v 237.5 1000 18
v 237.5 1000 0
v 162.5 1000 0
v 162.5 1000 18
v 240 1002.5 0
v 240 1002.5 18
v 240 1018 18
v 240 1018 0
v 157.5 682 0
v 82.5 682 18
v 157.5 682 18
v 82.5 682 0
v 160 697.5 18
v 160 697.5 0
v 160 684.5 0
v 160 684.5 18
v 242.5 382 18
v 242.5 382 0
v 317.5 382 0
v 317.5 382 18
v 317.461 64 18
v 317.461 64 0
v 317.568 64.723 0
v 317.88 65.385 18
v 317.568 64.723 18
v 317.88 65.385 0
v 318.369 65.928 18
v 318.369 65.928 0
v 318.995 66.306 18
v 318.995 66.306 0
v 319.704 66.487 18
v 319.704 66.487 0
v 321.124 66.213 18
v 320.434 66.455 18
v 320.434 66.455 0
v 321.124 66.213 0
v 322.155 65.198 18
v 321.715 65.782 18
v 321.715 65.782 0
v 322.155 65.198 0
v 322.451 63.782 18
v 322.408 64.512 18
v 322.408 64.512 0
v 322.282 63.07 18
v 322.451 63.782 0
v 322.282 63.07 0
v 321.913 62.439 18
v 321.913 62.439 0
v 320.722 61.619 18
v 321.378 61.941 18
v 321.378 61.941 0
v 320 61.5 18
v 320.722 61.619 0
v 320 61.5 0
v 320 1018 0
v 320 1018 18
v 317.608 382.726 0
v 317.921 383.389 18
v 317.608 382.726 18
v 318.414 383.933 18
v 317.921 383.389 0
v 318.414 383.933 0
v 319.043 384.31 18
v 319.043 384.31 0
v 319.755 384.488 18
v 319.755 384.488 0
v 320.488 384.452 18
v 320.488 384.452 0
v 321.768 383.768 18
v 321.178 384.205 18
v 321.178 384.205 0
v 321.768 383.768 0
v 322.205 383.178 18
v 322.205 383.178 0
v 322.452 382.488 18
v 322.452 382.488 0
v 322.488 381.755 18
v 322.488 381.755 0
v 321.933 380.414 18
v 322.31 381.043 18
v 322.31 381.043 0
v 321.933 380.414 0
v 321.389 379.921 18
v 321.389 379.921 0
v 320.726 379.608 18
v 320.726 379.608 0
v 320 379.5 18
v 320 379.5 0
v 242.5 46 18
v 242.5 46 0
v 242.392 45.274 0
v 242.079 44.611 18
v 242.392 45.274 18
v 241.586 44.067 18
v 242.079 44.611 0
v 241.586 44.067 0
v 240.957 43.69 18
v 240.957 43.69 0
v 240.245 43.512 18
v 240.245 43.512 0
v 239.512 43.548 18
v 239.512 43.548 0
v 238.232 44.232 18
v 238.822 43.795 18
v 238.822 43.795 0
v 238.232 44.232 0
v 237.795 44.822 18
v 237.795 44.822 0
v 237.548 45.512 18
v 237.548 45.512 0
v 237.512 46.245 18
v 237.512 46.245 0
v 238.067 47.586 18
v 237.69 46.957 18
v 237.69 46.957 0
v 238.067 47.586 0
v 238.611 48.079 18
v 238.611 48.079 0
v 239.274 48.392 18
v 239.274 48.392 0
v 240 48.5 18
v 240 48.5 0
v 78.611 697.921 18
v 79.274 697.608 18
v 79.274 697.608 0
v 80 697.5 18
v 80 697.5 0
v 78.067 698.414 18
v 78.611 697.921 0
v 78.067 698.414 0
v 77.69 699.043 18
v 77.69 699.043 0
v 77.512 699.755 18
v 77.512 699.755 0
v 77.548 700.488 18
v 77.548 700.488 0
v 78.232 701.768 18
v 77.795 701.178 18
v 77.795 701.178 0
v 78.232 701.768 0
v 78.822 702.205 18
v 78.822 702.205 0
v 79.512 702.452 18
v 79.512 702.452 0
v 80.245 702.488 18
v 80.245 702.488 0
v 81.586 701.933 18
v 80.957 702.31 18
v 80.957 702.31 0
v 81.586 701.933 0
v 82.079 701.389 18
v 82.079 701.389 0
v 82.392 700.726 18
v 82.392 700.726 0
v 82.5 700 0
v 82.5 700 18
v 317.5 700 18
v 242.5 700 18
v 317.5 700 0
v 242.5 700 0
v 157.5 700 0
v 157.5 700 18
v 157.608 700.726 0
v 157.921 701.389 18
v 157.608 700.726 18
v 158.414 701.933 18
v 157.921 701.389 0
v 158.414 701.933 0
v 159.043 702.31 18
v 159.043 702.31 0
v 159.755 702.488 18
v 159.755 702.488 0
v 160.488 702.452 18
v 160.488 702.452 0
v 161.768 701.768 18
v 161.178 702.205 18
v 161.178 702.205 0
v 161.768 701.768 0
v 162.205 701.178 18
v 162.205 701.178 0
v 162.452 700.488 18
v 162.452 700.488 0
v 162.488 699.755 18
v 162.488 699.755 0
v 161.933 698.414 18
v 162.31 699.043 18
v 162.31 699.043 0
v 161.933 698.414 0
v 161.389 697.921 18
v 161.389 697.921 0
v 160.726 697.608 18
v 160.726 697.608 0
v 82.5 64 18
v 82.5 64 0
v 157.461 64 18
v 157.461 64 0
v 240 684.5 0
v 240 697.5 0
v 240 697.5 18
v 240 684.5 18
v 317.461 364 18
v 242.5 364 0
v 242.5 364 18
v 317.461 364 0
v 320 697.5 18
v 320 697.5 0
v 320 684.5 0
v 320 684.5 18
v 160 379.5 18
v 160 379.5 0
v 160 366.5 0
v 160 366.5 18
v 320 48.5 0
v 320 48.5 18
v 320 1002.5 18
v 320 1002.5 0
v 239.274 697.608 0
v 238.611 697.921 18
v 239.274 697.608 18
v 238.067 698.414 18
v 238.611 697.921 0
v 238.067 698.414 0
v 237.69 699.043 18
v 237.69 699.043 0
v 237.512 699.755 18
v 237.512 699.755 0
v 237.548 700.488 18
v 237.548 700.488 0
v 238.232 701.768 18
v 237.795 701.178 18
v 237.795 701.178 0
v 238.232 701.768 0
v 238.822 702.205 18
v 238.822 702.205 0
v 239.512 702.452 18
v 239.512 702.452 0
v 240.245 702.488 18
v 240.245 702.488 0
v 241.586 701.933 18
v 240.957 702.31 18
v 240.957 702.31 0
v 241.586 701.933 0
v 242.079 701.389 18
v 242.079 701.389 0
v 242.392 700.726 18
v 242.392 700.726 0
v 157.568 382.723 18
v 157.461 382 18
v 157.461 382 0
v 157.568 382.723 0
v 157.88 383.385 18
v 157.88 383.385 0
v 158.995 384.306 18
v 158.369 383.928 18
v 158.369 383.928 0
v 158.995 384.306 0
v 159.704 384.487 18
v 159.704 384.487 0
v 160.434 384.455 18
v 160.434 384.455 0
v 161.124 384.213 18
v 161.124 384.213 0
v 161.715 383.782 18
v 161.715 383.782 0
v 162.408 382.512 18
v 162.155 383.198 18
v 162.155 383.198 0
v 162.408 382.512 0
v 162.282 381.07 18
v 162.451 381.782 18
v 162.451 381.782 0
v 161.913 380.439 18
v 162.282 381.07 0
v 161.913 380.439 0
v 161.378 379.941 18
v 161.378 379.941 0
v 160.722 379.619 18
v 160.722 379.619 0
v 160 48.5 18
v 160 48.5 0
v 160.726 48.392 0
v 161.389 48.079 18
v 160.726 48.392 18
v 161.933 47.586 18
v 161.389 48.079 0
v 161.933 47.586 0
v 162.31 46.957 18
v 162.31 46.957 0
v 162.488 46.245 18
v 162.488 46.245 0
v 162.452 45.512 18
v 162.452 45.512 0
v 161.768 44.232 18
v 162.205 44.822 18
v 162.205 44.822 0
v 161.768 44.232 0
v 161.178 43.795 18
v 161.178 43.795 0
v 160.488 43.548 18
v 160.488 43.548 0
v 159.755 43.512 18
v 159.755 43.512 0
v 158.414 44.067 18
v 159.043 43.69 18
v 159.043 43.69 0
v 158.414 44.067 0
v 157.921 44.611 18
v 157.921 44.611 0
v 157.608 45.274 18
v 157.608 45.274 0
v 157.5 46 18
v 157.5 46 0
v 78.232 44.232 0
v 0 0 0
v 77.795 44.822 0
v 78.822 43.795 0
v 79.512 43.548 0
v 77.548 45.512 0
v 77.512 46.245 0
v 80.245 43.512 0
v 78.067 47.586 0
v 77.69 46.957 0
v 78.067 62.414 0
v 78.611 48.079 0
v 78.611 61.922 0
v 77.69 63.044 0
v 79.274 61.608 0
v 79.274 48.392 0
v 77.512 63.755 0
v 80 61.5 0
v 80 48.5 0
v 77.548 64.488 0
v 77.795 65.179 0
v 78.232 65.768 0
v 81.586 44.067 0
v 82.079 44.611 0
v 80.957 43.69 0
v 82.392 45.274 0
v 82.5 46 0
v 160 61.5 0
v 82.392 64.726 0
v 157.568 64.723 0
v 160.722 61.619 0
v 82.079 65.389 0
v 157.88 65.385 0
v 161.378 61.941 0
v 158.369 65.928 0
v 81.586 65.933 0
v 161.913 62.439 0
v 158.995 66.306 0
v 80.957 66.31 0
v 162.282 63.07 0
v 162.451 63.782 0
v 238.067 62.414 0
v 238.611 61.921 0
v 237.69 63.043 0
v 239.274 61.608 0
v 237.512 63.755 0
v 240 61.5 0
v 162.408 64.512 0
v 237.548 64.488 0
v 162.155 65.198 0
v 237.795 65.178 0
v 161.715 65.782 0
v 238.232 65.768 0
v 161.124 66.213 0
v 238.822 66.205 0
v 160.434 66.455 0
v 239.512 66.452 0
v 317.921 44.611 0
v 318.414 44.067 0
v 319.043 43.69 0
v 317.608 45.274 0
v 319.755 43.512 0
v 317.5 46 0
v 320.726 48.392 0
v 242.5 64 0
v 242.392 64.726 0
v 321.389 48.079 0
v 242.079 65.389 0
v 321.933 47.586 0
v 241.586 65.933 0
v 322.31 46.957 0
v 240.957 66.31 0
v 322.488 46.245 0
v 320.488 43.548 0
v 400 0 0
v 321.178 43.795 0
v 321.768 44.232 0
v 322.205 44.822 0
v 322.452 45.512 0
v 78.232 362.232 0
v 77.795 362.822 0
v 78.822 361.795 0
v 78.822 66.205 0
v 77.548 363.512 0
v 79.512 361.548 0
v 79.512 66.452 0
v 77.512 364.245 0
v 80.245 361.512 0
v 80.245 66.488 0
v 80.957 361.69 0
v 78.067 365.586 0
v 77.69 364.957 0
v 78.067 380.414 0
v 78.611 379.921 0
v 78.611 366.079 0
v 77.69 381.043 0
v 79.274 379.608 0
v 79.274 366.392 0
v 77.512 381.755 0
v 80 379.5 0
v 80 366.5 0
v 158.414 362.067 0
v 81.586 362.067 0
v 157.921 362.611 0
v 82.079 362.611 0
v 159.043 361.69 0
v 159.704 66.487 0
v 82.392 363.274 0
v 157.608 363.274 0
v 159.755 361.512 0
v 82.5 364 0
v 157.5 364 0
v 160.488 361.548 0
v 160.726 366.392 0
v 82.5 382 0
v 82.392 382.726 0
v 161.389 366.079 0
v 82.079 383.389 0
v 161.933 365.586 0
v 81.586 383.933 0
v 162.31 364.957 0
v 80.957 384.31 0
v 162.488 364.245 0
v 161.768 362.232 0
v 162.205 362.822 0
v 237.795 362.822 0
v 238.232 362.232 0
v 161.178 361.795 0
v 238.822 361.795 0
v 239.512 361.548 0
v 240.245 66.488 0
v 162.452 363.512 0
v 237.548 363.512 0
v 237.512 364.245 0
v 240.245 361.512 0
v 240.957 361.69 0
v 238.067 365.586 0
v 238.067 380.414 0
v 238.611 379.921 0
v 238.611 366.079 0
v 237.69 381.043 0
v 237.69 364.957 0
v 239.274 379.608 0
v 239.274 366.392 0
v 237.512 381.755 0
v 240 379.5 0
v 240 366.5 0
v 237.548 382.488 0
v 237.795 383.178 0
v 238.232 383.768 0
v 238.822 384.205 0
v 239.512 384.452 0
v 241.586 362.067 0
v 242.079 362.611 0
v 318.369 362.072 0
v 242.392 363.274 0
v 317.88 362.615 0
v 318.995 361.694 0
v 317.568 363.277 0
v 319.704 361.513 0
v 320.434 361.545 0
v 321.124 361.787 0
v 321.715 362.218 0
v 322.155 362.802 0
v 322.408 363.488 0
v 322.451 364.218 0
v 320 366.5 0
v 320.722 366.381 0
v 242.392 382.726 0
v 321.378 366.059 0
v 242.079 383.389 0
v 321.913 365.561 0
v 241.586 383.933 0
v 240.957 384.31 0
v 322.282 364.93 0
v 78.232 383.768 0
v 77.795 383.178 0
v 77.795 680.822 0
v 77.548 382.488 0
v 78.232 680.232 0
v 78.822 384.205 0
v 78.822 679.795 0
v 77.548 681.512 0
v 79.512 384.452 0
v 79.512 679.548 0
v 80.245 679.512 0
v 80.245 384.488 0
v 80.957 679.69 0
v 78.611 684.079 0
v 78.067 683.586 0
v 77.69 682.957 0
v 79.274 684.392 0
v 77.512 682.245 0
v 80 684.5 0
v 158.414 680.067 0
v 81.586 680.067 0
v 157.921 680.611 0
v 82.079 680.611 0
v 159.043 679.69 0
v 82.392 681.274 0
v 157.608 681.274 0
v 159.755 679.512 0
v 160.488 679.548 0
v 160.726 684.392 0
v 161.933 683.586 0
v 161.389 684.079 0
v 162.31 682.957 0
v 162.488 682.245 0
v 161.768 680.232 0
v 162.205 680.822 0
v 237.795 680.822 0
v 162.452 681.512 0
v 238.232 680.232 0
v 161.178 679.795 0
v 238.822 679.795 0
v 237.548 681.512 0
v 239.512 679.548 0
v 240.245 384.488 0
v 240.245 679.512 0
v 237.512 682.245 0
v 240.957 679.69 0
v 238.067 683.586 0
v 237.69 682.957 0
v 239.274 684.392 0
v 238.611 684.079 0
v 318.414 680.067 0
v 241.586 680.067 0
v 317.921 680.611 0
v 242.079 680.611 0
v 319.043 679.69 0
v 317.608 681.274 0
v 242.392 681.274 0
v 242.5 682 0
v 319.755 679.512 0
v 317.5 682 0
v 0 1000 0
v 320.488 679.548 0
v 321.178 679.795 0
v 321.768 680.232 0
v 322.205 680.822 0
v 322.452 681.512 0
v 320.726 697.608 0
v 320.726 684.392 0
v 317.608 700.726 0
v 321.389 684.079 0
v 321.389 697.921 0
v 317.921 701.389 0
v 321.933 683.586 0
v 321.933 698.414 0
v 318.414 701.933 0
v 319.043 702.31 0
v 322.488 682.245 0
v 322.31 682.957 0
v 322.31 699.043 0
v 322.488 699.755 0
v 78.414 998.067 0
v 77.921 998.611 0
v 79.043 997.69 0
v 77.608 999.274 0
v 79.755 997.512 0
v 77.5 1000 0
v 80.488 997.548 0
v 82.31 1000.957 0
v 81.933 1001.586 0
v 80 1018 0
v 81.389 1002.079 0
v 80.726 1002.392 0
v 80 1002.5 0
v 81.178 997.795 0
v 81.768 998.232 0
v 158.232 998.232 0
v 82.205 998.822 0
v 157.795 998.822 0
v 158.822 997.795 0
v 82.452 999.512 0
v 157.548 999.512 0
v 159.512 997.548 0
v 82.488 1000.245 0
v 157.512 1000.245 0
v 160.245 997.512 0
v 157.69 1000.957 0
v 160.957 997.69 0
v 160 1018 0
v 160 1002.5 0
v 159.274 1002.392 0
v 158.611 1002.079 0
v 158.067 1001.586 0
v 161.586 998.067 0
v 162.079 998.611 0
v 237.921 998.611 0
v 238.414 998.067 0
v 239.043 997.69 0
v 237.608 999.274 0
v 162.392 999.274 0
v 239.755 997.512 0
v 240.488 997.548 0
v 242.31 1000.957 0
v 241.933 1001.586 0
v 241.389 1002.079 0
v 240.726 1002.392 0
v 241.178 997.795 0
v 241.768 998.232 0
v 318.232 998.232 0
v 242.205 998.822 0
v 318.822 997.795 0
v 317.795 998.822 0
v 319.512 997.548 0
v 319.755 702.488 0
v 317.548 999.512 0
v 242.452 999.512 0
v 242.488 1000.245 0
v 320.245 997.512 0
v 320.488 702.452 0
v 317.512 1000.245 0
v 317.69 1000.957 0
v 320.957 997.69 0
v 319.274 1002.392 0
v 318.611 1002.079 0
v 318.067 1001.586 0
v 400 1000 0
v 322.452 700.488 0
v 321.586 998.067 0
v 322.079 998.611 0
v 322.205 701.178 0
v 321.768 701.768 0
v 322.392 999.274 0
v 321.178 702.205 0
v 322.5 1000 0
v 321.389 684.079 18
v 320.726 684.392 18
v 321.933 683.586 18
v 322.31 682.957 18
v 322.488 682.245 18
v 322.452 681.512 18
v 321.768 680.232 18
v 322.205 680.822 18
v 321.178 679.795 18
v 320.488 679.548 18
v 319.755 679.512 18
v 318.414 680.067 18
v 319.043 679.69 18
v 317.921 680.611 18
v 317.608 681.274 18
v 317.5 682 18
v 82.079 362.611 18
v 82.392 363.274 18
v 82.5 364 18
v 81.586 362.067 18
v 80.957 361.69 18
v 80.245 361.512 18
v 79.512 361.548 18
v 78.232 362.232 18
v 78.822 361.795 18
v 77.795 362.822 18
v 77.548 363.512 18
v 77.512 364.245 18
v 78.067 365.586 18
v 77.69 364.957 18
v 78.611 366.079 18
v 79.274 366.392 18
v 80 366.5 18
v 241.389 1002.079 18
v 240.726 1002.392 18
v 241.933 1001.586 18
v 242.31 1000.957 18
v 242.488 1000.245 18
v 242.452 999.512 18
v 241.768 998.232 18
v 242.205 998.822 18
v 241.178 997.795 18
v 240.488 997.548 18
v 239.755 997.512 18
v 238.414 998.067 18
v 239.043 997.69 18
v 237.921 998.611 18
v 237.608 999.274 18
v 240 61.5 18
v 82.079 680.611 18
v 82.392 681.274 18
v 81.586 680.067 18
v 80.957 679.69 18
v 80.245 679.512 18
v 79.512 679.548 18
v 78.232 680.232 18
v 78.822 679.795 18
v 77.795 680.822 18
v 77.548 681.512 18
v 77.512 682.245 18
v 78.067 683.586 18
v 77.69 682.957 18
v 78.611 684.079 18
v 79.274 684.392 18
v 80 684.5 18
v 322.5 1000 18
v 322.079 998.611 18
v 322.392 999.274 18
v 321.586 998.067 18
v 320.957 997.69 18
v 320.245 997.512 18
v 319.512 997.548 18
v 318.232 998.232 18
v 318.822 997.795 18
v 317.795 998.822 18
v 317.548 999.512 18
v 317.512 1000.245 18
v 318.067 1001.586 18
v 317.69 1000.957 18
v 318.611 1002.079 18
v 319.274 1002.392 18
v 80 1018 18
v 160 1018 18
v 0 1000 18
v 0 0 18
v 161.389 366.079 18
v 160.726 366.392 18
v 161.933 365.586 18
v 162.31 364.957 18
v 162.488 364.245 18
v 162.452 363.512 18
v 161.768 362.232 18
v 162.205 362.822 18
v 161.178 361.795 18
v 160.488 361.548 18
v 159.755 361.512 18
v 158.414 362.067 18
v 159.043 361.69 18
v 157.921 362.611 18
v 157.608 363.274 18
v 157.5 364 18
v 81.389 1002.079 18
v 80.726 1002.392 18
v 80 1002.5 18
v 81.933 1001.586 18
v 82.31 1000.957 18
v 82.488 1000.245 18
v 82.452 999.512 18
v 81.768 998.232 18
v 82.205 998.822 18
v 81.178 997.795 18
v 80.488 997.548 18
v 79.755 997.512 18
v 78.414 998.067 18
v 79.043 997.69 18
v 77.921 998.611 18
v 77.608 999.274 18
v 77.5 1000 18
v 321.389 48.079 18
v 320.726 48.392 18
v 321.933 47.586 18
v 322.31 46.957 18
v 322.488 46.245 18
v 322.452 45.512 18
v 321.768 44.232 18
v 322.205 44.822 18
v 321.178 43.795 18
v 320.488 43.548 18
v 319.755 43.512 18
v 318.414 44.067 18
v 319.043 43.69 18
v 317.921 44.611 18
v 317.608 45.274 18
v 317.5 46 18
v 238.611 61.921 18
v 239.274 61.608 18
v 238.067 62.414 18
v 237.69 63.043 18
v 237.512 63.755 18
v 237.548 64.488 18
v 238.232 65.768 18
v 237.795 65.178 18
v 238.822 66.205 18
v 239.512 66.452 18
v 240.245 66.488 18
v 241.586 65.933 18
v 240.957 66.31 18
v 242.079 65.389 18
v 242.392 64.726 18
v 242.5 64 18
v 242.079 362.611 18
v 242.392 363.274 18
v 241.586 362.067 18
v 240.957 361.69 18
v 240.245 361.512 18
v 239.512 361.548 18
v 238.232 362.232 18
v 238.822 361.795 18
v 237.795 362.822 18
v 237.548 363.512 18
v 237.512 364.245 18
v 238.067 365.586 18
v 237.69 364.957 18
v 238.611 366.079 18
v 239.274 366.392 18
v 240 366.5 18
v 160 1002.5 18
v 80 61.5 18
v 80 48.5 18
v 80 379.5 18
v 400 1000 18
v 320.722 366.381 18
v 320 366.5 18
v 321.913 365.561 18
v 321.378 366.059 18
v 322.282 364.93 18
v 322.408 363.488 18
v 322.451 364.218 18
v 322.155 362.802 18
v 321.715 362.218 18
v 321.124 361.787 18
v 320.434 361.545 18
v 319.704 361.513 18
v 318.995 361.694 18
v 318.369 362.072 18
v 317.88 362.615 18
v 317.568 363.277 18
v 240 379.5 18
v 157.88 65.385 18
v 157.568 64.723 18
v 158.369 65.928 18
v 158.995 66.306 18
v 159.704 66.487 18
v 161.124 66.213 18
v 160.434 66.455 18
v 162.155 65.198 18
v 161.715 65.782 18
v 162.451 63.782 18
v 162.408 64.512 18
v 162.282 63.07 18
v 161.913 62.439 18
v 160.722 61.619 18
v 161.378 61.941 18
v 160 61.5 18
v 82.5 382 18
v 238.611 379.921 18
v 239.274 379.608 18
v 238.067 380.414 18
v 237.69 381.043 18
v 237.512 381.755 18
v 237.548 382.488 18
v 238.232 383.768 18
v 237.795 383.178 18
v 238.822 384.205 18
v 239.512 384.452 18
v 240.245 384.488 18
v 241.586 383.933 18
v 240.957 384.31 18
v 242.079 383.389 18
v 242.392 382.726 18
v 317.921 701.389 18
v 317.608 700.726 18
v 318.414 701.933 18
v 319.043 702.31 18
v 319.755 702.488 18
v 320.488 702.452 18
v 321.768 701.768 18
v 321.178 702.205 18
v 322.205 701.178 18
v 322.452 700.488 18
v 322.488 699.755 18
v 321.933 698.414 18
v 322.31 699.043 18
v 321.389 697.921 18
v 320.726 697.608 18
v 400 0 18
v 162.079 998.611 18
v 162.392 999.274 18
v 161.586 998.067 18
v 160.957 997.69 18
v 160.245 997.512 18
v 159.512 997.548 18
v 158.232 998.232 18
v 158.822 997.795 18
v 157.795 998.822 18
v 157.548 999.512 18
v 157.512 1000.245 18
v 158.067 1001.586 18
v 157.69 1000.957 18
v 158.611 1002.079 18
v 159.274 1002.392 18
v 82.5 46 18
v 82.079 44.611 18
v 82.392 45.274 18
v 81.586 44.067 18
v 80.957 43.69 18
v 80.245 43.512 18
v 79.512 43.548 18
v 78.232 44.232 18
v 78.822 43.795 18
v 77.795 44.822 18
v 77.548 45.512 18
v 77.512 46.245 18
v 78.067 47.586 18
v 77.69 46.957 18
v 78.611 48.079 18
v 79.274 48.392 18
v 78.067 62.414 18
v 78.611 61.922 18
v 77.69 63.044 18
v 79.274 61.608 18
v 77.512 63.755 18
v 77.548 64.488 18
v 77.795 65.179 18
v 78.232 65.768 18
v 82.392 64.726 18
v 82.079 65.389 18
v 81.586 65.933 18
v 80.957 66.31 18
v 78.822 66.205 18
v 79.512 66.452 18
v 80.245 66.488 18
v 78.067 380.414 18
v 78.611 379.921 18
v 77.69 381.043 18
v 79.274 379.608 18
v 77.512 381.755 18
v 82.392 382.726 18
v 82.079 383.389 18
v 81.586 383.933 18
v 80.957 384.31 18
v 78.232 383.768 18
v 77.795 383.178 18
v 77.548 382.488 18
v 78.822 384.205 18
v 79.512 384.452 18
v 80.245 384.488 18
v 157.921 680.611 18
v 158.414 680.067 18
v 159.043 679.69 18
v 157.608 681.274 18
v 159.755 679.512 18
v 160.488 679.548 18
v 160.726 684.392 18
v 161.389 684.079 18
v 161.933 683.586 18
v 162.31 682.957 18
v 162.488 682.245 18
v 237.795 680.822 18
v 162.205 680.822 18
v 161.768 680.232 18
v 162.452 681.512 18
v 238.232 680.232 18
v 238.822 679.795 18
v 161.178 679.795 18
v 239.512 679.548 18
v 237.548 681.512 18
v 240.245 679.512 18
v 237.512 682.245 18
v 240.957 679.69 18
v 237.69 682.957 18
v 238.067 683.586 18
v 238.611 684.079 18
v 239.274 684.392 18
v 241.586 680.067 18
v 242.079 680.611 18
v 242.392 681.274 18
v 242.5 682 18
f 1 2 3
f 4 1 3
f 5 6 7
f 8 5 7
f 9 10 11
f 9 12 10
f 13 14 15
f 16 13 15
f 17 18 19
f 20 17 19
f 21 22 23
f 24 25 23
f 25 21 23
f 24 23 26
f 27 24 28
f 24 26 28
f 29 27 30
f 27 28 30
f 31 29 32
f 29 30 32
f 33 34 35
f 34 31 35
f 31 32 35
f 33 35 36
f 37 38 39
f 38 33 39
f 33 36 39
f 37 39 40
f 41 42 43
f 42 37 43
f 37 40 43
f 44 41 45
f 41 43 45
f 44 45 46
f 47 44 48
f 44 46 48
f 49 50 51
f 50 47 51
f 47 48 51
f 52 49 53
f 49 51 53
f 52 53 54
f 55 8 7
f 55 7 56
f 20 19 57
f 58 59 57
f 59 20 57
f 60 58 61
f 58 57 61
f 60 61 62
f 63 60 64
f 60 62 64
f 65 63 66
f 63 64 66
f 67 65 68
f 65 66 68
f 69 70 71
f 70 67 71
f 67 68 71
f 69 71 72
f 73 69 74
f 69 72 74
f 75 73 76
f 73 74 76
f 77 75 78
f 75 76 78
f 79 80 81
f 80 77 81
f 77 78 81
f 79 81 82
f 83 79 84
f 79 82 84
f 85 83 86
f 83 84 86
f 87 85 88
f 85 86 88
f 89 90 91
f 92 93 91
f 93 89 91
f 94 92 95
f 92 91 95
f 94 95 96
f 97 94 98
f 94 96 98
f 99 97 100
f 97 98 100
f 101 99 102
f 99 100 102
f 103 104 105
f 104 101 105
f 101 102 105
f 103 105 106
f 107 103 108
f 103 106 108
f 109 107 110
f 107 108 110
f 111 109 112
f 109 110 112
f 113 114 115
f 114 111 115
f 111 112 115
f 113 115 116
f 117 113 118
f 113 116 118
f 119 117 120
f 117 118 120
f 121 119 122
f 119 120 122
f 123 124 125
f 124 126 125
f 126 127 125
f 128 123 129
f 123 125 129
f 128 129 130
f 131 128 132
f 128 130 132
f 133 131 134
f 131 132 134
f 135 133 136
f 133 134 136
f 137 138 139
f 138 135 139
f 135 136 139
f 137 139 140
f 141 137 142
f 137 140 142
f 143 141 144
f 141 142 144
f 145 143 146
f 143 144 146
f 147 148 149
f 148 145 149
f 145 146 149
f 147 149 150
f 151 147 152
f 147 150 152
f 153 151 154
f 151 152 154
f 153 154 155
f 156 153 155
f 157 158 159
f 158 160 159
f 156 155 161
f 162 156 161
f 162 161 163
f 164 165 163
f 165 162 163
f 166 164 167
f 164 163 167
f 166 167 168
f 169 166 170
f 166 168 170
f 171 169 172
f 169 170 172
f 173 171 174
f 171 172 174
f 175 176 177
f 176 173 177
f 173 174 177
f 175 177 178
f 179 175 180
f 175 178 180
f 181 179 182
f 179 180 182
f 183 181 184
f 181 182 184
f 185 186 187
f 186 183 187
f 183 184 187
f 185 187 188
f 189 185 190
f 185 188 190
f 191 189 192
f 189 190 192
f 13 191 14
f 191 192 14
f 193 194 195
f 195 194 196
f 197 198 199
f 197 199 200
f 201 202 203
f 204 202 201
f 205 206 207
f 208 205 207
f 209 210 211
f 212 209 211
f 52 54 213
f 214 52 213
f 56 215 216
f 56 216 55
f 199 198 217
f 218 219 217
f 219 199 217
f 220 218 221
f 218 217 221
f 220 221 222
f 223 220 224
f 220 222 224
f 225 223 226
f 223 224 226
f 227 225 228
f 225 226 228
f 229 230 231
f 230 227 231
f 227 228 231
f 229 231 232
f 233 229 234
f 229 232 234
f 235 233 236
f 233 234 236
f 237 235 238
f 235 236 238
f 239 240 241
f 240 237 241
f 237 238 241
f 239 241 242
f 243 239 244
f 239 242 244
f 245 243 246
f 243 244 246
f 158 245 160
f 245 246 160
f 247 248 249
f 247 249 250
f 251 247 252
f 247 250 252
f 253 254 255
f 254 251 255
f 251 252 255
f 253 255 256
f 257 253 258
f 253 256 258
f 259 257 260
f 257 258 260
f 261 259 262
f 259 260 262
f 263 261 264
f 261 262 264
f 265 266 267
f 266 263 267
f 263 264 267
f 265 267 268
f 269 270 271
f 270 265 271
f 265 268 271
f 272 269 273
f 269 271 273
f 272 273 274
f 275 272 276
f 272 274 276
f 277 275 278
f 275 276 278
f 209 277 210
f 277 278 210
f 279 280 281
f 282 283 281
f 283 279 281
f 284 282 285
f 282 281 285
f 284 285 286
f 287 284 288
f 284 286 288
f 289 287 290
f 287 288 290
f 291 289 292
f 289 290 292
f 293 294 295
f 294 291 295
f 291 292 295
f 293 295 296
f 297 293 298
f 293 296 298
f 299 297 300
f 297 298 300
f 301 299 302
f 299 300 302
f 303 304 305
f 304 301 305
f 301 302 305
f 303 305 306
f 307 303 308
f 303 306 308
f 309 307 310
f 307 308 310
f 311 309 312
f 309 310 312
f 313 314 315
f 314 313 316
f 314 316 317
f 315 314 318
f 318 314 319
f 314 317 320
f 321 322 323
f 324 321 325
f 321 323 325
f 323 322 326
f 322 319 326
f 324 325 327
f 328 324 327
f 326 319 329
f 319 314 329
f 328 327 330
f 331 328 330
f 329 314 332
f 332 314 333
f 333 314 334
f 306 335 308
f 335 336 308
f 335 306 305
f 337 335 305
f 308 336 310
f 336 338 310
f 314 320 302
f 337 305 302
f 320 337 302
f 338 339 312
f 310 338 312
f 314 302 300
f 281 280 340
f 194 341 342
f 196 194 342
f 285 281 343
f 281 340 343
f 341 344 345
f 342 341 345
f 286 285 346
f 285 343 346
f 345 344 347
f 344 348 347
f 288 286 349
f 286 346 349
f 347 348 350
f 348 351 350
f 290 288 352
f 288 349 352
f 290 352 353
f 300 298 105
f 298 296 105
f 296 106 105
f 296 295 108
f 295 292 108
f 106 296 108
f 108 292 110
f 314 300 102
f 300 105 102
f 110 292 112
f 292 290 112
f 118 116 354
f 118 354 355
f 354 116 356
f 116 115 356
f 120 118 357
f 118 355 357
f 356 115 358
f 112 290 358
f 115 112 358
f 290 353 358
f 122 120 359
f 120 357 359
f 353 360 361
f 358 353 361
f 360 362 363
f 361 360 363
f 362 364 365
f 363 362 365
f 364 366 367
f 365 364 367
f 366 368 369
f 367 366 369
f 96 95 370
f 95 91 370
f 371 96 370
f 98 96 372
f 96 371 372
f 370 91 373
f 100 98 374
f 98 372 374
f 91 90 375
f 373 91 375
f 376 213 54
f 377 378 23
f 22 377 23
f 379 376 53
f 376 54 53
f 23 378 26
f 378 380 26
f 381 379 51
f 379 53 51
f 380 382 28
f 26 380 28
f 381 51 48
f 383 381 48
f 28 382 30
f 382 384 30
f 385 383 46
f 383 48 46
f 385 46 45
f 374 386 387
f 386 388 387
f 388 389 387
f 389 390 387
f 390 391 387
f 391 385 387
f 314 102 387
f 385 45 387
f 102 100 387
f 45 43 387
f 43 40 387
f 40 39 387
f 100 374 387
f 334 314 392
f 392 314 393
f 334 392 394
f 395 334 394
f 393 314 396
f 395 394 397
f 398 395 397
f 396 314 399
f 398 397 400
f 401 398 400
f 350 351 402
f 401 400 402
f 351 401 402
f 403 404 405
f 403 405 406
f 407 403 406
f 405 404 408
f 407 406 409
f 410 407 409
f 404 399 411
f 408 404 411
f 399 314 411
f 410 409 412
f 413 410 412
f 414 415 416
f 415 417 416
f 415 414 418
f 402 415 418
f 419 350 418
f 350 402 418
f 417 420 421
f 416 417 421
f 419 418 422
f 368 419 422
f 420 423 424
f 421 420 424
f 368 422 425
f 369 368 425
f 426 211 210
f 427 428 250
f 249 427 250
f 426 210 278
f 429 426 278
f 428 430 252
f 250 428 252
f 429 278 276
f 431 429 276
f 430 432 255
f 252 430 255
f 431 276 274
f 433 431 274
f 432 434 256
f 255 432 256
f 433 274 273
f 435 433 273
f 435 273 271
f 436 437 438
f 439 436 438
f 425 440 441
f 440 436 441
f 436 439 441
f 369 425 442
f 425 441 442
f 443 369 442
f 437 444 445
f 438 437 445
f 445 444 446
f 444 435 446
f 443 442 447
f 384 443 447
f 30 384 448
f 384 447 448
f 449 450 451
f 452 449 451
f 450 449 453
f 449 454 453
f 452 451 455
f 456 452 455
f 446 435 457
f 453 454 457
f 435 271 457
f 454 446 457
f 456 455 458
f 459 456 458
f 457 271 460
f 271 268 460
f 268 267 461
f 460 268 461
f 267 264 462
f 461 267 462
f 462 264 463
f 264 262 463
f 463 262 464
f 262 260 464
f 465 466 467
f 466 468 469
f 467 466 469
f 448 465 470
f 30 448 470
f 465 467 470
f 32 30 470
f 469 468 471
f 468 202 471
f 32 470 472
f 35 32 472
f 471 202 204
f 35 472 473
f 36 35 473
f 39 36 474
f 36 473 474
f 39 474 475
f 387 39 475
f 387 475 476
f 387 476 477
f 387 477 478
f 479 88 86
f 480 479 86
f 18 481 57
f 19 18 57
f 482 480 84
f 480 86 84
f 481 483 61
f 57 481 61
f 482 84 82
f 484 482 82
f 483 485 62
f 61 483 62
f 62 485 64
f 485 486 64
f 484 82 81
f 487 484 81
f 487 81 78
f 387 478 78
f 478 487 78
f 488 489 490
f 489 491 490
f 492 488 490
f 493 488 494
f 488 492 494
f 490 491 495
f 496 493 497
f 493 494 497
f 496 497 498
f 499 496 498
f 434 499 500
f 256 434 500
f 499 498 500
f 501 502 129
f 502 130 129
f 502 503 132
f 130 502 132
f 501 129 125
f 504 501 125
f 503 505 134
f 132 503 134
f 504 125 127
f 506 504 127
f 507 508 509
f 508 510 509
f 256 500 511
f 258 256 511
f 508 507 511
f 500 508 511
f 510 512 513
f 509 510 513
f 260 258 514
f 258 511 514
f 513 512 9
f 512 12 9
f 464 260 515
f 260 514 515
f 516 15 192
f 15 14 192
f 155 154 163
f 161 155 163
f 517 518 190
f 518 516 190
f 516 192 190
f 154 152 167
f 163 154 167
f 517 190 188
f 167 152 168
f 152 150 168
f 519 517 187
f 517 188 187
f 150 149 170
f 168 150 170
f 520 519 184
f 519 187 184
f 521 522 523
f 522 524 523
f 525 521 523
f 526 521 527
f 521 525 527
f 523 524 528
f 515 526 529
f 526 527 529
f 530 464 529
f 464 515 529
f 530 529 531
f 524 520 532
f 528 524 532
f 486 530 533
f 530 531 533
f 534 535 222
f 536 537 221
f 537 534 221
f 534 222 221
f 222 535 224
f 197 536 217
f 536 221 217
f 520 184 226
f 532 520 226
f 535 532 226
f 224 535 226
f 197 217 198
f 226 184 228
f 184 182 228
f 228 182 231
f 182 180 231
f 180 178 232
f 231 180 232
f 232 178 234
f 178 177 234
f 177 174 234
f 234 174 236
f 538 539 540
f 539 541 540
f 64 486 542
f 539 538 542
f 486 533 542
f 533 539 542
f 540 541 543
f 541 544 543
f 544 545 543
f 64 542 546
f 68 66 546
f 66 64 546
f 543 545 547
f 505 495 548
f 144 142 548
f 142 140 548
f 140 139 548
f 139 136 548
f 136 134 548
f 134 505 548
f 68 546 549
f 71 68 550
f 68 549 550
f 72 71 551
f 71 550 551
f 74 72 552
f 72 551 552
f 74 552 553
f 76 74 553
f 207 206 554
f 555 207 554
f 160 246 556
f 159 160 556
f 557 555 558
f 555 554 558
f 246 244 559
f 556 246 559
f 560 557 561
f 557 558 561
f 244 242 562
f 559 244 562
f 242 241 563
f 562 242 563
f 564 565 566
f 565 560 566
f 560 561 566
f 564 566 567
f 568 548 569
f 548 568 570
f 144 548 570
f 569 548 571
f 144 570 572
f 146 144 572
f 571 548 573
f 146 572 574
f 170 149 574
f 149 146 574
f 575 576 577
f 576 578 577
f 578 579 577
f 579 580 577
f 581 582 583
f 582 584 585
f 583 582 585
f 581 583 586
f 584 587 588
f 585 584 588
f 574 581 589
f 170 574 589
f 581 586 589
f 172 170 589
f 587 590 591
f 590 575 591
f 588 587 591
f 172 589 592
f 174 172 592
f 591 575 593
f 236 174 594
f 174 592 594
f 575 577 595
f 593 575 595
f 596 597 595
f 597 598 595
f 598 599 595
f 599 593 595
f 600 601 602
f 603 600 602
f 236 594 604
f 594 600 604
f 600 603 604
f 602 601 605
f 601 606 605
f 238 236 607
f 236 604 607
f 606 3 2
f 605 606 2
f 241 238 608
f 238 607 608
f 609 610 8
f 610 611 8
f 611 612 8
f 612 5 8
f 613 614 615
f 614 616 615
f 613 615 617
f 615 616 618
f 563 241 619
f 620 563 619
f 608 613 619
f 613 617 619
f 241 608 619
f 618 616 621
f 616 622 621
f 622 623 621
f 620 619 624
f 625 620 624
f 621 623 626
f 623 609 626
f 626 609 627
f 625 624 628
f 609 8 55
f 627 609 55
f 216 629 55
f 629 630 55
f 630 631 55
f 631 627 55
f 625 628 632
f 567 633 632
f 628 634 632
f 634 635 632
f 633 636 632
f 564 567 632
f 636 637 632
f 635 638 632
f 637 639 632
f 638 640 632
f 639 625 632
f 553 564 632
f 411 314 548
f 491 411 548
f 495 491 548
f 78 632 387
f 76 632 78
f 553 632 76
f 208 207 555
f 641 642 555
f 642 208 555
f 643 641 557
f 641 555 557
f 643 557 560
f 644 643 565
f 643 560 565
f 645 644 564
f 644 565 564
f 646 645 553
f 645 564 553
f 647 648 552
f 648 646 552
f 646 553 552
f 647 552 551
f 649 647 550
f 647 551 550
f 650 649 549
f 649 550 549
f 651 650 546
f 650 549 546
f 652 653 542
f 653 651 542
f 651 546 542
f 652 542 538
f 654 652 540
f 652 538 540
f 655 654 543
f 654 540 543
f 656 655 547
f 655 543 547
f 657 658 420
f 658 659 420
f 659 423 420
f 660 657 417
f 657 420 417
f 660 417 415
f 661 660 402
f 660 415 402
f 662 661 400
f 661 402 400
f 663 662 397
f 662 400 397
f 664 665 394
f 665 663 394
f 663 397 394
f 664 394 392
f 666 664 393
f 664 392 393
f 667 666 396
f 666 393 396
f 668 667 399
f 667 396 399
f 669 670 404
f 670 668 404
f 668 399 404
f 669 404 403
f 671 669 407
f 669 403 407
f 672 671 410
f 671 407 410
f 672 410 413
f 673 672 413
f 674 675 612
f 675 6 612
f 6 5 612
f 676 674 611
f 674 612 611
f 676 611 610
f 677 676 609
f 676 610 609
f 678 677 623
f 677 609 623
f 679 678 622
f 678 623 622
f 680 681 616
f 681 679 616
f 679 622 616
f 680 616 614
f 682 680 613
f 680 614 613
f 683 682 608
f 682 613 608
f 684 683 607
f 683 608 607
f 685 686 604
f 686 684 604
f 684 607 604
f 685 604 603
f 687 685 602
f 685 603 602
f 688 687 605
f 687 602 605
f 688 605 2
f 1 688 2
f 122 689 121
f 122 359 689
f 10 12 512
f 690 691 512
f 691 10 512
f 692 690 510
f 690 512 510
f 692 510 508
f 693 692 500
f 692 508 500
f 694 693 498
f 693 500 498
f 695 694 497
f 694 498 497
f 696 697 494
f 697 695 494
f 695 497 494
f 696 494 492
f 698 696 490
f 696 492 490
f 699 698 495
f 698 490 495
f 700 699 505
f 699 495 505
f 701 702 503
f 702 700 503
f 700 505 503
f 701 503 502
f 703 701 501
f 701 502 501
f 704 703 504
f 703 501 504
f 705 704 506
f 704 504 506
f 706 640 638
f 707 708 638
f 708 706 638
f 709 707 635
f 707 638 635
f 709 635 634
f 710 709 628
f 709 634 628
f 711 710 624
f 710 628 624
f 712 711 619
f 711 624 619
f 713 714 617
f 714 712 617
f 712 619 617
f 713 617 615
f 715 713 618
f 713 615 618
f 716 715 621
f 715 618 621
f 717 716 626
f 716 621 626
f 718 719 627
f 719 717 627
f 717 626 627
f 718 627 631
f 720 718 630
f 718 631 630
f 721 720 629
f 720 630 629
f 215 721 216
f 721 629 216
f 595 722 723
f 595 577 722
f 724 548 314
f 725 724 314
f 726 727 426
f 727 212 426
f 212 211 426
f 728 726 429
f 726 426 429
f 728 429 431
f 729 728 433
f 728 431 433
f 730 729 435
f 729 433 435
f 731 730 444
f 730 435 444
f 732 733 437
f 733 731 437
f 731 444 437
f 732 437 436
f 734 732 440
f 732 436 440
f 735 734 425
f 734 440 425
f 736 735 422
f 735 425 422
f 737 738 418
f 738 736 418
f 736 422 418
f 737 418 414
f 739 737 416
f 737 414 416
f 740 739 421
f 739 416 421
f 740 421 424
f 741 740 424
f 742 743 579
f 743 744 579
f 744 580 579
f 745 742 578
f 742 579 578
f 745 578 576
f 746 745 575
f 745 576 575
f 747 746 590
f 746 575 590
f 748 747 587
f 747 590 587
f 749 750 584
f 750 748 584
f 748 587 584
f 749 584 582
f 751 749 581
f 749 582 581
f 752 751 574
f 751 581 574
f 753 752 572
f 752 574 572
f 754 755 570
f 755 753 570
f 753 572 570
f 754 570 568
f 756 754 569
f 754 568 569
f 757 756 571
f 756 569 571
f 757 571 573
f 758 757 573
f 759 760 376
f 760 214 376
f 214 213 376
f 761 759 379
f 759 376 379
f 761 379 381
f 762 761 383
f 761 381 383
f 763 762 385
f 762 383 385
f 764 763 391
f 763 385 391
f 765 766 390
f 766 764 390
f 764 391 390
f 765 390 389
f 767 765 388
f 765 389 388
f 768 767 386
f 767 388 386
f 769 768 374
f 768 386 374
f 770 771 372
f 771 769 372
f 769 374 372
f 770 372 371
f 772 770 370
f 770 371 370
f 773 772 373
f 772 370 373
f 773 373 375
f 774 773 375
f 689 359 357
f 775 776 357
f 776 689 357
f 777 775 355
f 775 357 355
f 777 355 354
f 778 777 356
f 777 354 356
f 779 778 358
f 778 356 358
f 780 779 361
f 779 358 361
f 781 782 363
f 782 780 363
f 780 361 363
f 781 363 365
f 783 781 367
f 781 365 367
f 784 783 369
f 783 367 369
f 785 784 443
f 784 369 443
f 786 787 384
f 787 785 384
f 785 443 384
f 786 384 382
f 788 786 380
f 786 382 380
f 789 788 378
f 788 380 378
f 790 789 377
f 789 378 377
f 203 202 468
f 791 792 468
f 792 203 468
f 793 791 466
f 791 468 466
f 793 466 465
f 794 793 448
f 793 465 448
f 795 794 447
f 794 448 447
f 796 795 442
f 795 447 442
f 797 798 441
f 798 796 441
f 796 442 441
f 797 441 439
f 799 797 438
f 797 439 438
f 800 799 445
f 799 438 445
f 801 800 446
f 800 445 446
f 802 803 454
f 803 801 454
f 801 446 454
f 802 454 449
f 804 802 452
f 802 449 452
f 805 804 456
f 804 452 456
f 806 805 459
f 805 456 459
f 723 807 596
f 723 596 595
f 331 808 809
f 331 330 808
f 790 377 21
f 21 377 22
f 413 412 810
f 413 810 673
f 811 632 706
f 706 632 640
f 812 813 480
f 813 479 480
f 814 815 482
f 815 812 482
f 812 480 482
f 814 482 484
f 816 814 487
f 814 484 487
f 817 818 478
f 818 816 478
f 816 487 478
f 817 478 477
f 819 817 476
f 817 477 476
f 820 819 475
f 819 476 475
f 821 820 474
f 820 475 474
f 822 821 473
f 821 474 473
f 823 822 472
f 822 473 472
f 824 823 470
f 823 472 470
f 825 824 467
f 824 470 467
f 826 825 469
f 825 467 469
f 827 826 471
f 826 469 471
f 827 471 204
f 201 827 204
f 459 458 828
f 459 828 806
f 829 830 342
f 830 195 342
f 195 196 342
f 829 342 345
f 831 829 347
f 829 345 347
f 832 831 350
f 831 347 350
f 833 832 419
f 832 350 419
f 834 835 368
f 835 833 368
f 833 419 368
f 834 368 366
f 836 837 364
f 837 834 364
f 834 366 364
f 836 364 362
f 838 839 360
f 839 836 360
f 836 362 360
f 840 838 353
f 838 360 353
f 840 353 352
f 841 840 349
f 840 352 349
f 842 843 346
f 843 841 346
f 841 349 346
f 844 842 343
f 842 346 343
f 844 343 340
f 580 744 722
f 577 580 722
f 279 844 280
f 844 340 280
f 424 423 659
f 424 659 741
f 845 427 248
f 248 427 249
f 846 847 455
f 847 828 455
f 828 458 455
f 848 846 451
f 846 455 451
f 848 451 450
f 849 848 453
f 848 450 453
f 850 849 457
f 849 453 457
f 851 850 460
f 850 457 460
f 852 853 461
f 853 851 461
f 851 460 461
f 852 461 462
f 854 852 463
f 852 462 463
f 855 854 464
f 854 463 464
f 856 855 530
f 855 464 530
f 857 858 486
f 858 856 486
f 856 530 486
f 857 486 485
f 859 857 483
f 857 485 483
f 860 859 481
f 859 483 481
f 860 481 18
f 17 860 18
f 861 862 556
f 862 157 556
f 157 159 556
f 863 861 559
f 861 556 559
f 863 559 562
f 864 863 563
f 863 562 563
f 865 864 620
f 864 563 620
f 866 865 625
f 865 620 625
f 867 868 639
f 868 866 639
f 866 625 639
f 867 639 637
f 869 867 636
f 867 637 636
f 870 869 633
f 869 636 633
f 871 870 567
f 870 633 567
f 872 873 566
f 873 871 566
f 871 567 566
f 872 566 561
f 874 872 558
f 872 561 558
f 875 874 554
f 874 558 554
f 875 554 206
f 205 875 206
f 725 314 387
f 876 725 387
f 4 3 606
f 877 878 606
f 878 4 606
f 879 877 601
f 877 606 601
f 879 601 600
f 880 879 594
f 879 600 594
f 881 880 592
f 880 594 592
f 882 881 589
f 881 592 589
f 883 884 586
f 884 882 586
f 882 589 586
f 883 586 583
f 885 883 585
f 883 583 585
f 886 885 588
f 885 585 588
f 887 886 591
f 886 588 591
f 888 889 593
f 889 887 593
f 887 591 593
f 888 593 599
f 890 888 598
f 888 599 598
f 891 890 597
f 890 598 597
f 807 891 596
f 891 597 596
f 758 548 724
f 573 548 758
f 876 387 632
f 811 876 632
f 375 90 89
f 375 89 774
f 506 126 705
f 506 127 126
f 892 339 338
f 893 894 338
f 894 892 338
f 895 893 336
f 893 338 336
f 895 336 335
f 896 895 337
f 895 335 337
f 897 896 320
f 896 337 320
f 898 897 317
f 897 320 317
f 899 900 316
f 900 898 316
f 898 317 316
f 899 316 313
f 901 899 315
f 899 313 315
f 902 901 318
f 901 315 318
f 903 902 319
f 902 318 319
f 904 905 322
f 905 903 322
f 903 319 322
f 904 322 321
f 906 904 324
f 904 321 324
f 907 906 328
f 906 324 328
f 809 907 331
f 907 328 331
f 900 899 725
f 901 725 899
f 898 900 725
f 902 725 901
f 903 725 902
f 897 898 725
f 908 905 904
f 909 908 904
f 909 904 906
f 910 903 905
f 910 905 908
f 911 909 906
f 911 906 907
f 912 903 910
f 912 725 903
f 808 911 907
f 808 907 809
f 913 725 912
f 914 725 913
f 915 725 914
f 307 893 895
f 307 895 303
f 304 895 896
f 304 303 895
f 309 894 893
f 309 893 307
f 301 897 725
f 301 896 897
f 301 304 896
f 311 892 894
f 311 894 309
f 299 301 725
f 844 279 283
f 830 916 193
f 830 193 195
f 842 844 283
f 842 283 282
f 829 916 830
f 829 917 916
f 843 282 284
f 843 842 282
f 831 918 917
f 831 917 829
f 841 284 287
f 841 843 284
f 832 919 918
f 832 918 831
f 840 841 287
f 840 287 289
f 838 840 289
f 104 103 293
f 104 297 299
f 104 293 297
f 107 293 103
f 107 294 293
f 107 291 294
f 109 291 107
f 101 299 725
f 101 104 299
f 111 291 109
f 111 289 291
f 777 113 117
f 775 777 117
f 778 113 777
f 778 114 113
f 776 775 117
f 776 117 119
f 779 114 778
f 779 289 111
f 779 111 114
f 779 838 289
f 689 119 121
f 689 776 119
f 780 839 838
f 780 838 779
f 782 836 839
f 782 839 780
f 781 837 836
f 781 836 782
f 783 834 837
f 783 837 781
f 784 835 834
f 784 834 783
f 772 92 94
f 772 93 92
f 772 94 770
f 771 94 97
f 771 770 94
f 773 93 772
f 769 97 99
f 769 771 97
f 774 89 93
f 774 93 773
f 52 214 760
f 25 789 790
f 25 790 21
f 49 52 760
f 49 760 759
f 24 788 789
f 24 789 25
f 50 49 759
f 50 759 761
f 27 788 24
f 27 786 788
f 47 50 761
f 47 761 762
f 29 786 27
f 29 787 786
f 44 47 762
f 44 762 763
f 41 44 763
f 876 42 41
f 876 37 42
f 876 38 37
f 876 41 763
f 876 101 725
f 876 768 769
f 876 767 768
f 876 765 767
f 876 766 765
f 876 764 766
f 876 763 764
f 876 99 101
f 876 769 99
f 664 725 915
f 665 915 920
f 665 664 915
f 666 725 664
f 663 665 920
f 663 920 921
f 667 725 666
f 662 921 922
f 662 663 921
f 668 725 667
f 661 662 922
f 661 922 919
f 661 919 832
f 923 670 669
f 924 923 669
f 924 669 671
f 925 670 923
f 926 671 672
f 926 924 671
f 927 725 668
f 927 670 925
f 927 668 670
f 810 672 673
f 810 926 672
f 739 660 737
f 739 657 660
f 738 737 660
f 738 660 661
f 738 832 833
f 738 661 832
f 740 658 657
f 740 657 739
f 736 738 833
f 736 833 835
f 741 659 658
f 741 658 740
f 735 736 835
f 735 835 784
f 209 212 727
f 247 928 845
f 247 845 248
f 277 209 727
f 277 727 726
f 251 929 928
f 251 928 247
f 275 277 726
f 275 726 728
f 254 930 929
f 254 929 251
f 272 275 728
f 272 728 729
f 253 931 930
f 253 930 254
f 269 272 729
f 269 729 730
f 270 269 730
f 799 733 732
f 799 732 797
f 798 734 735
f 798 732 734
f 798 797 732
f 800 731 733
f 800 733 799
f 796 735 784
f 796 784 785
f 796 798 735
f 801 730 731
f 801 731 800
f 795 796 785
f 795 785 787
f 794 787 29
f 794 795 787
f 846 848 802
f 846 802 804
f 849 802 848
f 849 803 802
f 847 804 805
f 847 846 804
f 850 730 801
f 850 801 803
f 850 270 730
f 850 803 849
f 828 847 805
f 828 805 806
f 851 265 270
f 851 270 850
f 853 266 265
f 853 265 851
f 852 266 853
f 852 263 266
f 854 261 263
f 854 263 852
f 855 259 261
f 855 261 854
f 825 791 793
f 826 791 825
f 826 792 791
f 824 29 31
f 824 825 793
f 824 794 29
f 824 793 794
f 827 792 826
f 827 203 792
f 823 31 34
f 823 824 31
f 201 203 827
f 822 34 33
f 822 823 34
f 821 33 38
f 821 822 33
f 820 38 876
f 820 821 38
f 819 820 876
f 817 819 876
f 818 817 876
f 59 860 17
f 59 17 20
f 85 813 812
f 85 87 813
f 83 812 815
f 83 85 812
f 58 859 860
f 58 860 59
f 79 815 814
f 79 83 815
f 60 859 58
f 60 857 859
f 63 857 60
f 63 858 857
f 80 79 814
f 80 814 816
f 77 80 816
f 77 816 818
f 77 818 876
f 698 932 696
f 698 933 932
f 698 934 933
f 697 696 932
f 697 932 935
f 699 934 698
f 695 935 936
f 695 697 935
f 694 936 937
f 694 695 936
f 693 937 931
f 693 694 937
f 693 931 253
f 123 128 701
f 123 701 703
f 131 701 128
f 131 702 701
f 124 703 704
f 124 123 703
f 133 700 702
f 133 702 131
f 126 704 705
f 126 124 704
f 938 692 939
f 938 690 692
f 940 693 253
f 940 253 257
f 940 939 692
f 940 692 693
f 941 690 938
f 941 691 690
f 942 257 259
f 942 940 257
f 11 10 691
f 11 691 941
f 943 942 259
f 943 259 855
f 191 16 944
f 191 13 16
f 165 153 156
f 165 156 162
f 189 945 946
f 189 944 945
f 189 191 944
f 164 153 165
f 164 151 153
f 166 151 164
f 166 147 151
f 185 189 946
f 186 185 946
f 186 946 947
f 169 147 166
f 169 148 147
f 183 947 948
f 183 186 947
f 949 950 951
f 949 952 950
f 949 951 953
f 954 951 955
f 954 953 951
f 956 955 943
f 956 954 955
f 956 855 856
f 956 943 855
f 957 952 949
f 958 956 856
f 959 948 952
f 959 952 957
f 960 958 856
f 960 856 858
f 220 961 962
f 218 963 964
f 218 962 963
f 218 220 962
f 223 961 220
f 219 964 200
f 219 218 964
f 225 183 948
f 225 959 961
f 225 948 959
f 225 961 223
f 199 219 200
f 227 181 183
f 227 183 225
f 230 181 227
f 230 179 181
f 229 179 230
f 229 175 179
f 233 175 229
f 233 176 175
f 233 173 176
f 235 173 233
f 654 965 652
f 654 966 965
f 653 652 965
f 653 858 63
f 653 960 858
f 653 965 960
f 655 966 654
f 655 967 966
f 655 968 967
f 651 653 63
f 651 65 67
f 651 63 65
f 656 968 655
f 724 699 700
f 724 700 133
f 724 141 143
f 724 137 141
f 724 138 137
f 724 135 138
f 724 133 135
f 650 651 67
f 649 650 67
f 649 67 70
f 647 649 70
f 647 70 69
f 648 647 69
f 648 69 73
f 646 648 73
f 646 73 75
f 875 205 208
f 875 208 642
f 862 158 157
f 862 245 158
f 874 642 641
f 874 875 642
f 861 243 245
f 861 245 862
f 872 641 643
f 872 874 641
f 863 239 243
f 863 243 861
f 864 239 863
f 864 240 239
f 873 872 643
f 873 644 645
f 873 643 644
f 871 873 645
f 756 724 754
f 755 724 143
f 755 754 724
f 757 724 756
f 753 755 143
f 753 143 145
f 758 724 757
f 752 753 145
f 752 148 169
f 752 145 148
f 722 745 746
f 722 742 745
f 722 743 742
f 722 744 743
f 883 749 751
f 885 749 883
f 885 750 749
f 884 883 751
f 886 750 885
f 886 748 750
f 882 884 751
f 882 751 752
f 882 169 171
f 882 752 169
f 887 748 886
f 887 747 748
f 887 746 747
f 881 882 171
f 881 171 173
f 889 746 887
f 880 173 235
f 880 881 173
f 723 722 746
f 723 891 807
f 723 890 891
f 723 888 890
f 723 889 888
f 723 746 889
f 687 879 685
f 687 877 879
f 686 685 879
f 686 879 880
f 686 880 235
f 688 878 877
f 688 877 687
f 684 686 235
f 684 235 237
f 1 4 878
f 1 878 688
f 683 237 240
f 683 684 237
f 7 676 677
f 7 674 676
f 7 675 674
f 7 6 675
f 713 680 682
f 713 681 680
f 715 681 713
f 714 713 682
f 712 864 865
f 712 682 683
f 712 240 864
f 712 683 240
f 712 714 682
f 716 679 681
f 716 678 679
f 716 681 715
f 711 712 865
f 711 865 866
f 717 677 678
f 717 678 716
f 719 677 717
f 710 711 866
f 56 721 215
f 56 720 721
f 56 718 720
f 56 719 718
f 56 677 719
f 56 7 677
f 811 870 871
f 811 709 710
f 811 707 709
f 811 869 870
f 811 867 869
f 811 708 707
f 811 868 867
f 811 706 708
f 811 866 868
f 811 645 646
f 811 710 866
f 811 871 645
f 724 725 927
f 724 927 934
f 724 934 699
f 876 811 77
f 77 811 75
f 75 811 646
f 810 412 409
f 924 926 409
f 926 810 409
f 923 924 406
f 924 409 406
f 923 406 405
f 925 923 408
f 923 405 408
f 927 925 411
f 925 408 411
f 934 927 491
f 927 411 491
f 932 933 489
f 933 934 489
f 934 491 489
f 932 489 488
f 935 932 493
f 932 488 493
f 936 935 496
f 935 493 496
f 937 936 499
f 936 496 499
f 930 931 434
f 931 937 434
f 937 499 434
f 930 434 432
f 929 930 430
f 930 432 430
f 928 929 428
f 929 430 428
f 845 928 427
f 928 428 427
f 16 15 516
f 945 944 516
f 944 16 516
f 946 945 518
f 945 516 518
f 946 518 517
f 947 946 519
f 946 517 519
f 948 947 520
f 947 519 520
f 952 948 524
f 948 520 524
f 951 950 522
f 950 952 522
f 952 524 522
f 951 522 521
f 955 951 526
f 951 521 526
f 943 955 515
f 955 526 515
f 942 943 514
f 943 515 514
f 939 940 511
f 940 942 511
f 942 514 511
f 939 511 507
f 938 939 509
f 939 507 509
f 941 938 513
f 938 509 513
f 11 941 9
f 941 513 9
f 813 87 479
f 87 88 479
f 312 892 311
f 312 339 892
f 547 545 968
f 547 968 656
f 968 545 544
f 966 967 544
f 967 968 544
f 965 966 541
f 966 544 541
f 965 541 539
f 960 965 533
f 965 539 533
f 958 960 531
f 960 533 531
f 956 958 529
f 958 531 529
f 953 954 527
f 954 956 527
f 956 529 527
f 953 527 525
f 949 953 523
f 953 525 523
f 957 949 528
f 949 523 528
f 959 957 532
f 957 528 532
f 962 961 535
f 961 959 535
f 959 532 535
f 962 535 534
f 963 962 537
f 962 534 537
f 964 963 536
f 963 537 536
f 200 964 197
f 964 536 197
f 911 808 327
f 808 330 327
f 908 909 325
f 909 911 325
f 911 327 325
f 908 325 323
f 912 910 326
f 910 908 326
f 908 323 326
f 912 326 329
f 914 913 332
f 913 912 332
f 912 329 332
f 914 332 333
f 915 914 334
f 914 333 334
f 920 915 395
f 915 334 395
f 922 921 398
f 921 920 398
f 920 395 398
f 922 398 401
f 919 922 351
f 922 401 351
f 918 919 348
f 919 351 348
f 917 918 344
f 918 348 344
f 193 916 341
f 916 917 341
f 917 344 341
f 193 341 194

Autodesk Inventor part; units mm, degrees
ref_plane "YZ Plane" through (0, 0, 0) normal (1, 0, 0) x (0, 1, 0)
ref_plane "XZ Plane" through (0, 0, 0) normal (0, 1, 0) x (-1, 0, 0)
ref_plane "XY Plane" through (0, 0, 0) normal (0, 0, 1) x (1, 0, 0)
sketch "Sketch1" plane through (0, 0, 0) normal (0, 0, 1) x (1, 0, 0)
  line L0 (0, 0) -> (400, 0)
  line L1 (400, 0) -> (400, 1000)
  line L2 (0, 1000) -> (0, 0)
  line L3 (80, 1002.5) -> (80, 1018)
  line L4 (160, 1002.5) -> (160, 1018)
  line L5 (240, 1002.5) -> (240, 1018)
  line L6 (320, 1002.5) -> (320, 1018)
  line L7 (80, 1018) -> (160, 1018)
  line L8 (240, 1018) -> (320, 1018)
  line L9 (400, 1000) -> (322.5, 1000)
  line L10 (237.5, 1000) -> (162.5, 1000)
  arc A0 (77.5, 1000) -> (80, 1002.5) centre (80, 1000) ccw
  arc A1 (160, 1002.5) -> (162.5, 1000) centre (160, 1000) ccw
  arc A2 (237.5, 1000) -> (240, 1002.5) centre (240, 1000) ccw
  arc A3 (320, 1002.5) -> (322.5, 1000) centre (320, 1000) ccw
  line L11 (0, 1000) -> (77.5, 1000)
  line L12 (80, 697.5) -> (80, 684.5)
  line L13 (160, 697.5) -> (160, 684.5)
  line L14 (240, 697.5) -> (240, 684.5)
  line L15 (320, 697.5) -> (320, 684.5)
  line L16 (82.5, 682) -> (157.5, 682)
  line L17 (242.5, 682) -> (317.5, 682)
  line L18 (82.5, 700) -> (157.5, 700)
  line L19 (242.5, 700) -> (317.5, 700)
  line L20 (80, 379.5) -> (80, 366.5)
  line L21 (80, 61.5003) -> (80, 48.5)
  line L22 (160, 379.5003) -> (160, 366.5)
  line L23 (160, 61.5003) -> (160, 48.5)
  line L24 (240, 379.5) -> (240, 366.5)
  line L25 (240, 61.5) -> (240, 48.5)
  line L26 (320, 379.5) -> (320, 366.4997)
  line L27 (320, 61.5003) -> (320, 48.5)
  line L28 (82.5, 382) -> (157.4609, 382)
  line L29 (82.5, 364) -> (157.5, 364)
  line L30 (242.5, 364) -> (317.4609, 364)
  line L31 (82.5, 64) -> (157.4609, 64)
  line L32 (242.5, 64) -> (317.4609, 64)
  line L33 (82.5, 46) -> (157.5, 46)
  line L34 (242.5, 46) -> (317.5, 46)
  arc A4 (82.5, 700) -> (80, 697.5) centre (80, 700) ccw
  arc A5 (160, 697.5) -> (157.5, 700) centre (160, 700) ccw
  arc A6 (157.5, 682) -> (160, 684.5) centre (160, 682) ccw
  arc A7 (80, 684.5) -> (82.5, 682) centre (80, 682) ccw
  arc A8 (242.5, 700) -> (240, 697.5) centre (240, 700) ccw
  arc A9 (240, 684.5) -> (242.5, 682) centre (240, 682) ccw
  arc A10 (320, 697.5) -> (317.5, 700) centre (320, 700) ccw
  arc A11 (317.5, 682) -> (320, 684.5) centre (320, 682) ccw
  arc A12 (320, 379.5) -> (317.5, 382) centre (320, 382) ccw
  arc A13 (317.4609, 364) -> (320, 366.4997) centre (319.9609, 364) ccw
  arc A14 (242.5, 382) -> (240, 379.5) centre (240, 382) ccw
  arc A15 (240, 366.5) -> (242.5, 364) centre (240, 364) ccw
  arc A16 (157.5, 364) -> (160, 366.5) centre (160, 364) ccw
  arc A17 (160, 379.5003) -> (157.4609, 382) centre (159.9609, 382) ccw
  arc A18 (82.5, 382) -> (80, 379.5) centre (80, 382) ccw
  arc A19 (80, 366.5) -> (82.5, 364) centre (80, 364) ccw
  arc A20 (82.5, 64) -> (80, 61.5003) centre (80, 64.0003) ccw
  arc A21 (160, 61.5003) -> (157.4609, 64) centre (159.9609, 64) ccw
  arc A22 (157.5, 46) -> (160, 48.5) centre (160, 46) ccw
  arc A23 (80, 48.5) -> (82.5, 46) centre (80, 46) ccw
  arc A24 (242.5, 64) -> (240, 61.5) centre (240, 64) ccw
  arc A25 (320, 61.5003) -> (317.4609, 64) centre (319.9609, 64) ccw
  arc A26 (317.5, 46) -> (320, 48.5) centre (320, 46) ccw
  arc A27 (240, 48.5) -> (242.5, 46) centre (240, 46) ccw
  line L35 (242.5, 382) -> (317.5, 382)
  dimension "d1" = 1000
  dimension "d4" = 80
  dimension "d5" = 80
  dimension "d6" = 80
  dimension "d7" = 400
  dimension "d9" = 5
  dimension "d10" = 5
  dimension "d11" = 5
  dimension "d12" = 5
  dimension "d19" = 80
  dimension "d20" = 80
  dimension "d21" = 80
  dimension "d22" = 80
  dimension "d23" = 18
  dimension "d24" = 18
  dimension "d31" = 80
  dimension "d33" = 80
  dimension "d34" = 80
  dimension "d38" = 18
  dimension "d41" = 18
  dimension "d42" = 18
  dimension "d43" = 80
  dimension "d44" = 80
  dimension "d45" = 80
  dimension "d46" = 80
  dimension "d47" = 5
  dimension "d48" = 5
  dimension "d49" = 5
  dimension "d50" = 5
  dimension "d51" = 5
  dimension "d52" = 5
  dimension "d53" = 5
  dimension "d54" = 5
  dimension "d55" = 5
  dimension "d56" = 5
  dimension "d57" = 5
  dimension "d58" = 5
  dimension "d59" = 5
  dimension "d60" = 5
  dimension "d61" = 5
  dimension "d62" = 5
  dimension "d63" = 5
  dimension "d64" = 5
  dimension "d65" = 5
  dimension "d66" = 5
  dimension "d67" = 5
  dimension "d68" = 5
  dimension "d69" = 5
  dimension "d70" = 5
  dimension "d71" = 80
  dimension "d72" = 18
extrude "Extrusion1" add sketch "Sketch1" along normal blind 18
properties part number "tapa laterales"
